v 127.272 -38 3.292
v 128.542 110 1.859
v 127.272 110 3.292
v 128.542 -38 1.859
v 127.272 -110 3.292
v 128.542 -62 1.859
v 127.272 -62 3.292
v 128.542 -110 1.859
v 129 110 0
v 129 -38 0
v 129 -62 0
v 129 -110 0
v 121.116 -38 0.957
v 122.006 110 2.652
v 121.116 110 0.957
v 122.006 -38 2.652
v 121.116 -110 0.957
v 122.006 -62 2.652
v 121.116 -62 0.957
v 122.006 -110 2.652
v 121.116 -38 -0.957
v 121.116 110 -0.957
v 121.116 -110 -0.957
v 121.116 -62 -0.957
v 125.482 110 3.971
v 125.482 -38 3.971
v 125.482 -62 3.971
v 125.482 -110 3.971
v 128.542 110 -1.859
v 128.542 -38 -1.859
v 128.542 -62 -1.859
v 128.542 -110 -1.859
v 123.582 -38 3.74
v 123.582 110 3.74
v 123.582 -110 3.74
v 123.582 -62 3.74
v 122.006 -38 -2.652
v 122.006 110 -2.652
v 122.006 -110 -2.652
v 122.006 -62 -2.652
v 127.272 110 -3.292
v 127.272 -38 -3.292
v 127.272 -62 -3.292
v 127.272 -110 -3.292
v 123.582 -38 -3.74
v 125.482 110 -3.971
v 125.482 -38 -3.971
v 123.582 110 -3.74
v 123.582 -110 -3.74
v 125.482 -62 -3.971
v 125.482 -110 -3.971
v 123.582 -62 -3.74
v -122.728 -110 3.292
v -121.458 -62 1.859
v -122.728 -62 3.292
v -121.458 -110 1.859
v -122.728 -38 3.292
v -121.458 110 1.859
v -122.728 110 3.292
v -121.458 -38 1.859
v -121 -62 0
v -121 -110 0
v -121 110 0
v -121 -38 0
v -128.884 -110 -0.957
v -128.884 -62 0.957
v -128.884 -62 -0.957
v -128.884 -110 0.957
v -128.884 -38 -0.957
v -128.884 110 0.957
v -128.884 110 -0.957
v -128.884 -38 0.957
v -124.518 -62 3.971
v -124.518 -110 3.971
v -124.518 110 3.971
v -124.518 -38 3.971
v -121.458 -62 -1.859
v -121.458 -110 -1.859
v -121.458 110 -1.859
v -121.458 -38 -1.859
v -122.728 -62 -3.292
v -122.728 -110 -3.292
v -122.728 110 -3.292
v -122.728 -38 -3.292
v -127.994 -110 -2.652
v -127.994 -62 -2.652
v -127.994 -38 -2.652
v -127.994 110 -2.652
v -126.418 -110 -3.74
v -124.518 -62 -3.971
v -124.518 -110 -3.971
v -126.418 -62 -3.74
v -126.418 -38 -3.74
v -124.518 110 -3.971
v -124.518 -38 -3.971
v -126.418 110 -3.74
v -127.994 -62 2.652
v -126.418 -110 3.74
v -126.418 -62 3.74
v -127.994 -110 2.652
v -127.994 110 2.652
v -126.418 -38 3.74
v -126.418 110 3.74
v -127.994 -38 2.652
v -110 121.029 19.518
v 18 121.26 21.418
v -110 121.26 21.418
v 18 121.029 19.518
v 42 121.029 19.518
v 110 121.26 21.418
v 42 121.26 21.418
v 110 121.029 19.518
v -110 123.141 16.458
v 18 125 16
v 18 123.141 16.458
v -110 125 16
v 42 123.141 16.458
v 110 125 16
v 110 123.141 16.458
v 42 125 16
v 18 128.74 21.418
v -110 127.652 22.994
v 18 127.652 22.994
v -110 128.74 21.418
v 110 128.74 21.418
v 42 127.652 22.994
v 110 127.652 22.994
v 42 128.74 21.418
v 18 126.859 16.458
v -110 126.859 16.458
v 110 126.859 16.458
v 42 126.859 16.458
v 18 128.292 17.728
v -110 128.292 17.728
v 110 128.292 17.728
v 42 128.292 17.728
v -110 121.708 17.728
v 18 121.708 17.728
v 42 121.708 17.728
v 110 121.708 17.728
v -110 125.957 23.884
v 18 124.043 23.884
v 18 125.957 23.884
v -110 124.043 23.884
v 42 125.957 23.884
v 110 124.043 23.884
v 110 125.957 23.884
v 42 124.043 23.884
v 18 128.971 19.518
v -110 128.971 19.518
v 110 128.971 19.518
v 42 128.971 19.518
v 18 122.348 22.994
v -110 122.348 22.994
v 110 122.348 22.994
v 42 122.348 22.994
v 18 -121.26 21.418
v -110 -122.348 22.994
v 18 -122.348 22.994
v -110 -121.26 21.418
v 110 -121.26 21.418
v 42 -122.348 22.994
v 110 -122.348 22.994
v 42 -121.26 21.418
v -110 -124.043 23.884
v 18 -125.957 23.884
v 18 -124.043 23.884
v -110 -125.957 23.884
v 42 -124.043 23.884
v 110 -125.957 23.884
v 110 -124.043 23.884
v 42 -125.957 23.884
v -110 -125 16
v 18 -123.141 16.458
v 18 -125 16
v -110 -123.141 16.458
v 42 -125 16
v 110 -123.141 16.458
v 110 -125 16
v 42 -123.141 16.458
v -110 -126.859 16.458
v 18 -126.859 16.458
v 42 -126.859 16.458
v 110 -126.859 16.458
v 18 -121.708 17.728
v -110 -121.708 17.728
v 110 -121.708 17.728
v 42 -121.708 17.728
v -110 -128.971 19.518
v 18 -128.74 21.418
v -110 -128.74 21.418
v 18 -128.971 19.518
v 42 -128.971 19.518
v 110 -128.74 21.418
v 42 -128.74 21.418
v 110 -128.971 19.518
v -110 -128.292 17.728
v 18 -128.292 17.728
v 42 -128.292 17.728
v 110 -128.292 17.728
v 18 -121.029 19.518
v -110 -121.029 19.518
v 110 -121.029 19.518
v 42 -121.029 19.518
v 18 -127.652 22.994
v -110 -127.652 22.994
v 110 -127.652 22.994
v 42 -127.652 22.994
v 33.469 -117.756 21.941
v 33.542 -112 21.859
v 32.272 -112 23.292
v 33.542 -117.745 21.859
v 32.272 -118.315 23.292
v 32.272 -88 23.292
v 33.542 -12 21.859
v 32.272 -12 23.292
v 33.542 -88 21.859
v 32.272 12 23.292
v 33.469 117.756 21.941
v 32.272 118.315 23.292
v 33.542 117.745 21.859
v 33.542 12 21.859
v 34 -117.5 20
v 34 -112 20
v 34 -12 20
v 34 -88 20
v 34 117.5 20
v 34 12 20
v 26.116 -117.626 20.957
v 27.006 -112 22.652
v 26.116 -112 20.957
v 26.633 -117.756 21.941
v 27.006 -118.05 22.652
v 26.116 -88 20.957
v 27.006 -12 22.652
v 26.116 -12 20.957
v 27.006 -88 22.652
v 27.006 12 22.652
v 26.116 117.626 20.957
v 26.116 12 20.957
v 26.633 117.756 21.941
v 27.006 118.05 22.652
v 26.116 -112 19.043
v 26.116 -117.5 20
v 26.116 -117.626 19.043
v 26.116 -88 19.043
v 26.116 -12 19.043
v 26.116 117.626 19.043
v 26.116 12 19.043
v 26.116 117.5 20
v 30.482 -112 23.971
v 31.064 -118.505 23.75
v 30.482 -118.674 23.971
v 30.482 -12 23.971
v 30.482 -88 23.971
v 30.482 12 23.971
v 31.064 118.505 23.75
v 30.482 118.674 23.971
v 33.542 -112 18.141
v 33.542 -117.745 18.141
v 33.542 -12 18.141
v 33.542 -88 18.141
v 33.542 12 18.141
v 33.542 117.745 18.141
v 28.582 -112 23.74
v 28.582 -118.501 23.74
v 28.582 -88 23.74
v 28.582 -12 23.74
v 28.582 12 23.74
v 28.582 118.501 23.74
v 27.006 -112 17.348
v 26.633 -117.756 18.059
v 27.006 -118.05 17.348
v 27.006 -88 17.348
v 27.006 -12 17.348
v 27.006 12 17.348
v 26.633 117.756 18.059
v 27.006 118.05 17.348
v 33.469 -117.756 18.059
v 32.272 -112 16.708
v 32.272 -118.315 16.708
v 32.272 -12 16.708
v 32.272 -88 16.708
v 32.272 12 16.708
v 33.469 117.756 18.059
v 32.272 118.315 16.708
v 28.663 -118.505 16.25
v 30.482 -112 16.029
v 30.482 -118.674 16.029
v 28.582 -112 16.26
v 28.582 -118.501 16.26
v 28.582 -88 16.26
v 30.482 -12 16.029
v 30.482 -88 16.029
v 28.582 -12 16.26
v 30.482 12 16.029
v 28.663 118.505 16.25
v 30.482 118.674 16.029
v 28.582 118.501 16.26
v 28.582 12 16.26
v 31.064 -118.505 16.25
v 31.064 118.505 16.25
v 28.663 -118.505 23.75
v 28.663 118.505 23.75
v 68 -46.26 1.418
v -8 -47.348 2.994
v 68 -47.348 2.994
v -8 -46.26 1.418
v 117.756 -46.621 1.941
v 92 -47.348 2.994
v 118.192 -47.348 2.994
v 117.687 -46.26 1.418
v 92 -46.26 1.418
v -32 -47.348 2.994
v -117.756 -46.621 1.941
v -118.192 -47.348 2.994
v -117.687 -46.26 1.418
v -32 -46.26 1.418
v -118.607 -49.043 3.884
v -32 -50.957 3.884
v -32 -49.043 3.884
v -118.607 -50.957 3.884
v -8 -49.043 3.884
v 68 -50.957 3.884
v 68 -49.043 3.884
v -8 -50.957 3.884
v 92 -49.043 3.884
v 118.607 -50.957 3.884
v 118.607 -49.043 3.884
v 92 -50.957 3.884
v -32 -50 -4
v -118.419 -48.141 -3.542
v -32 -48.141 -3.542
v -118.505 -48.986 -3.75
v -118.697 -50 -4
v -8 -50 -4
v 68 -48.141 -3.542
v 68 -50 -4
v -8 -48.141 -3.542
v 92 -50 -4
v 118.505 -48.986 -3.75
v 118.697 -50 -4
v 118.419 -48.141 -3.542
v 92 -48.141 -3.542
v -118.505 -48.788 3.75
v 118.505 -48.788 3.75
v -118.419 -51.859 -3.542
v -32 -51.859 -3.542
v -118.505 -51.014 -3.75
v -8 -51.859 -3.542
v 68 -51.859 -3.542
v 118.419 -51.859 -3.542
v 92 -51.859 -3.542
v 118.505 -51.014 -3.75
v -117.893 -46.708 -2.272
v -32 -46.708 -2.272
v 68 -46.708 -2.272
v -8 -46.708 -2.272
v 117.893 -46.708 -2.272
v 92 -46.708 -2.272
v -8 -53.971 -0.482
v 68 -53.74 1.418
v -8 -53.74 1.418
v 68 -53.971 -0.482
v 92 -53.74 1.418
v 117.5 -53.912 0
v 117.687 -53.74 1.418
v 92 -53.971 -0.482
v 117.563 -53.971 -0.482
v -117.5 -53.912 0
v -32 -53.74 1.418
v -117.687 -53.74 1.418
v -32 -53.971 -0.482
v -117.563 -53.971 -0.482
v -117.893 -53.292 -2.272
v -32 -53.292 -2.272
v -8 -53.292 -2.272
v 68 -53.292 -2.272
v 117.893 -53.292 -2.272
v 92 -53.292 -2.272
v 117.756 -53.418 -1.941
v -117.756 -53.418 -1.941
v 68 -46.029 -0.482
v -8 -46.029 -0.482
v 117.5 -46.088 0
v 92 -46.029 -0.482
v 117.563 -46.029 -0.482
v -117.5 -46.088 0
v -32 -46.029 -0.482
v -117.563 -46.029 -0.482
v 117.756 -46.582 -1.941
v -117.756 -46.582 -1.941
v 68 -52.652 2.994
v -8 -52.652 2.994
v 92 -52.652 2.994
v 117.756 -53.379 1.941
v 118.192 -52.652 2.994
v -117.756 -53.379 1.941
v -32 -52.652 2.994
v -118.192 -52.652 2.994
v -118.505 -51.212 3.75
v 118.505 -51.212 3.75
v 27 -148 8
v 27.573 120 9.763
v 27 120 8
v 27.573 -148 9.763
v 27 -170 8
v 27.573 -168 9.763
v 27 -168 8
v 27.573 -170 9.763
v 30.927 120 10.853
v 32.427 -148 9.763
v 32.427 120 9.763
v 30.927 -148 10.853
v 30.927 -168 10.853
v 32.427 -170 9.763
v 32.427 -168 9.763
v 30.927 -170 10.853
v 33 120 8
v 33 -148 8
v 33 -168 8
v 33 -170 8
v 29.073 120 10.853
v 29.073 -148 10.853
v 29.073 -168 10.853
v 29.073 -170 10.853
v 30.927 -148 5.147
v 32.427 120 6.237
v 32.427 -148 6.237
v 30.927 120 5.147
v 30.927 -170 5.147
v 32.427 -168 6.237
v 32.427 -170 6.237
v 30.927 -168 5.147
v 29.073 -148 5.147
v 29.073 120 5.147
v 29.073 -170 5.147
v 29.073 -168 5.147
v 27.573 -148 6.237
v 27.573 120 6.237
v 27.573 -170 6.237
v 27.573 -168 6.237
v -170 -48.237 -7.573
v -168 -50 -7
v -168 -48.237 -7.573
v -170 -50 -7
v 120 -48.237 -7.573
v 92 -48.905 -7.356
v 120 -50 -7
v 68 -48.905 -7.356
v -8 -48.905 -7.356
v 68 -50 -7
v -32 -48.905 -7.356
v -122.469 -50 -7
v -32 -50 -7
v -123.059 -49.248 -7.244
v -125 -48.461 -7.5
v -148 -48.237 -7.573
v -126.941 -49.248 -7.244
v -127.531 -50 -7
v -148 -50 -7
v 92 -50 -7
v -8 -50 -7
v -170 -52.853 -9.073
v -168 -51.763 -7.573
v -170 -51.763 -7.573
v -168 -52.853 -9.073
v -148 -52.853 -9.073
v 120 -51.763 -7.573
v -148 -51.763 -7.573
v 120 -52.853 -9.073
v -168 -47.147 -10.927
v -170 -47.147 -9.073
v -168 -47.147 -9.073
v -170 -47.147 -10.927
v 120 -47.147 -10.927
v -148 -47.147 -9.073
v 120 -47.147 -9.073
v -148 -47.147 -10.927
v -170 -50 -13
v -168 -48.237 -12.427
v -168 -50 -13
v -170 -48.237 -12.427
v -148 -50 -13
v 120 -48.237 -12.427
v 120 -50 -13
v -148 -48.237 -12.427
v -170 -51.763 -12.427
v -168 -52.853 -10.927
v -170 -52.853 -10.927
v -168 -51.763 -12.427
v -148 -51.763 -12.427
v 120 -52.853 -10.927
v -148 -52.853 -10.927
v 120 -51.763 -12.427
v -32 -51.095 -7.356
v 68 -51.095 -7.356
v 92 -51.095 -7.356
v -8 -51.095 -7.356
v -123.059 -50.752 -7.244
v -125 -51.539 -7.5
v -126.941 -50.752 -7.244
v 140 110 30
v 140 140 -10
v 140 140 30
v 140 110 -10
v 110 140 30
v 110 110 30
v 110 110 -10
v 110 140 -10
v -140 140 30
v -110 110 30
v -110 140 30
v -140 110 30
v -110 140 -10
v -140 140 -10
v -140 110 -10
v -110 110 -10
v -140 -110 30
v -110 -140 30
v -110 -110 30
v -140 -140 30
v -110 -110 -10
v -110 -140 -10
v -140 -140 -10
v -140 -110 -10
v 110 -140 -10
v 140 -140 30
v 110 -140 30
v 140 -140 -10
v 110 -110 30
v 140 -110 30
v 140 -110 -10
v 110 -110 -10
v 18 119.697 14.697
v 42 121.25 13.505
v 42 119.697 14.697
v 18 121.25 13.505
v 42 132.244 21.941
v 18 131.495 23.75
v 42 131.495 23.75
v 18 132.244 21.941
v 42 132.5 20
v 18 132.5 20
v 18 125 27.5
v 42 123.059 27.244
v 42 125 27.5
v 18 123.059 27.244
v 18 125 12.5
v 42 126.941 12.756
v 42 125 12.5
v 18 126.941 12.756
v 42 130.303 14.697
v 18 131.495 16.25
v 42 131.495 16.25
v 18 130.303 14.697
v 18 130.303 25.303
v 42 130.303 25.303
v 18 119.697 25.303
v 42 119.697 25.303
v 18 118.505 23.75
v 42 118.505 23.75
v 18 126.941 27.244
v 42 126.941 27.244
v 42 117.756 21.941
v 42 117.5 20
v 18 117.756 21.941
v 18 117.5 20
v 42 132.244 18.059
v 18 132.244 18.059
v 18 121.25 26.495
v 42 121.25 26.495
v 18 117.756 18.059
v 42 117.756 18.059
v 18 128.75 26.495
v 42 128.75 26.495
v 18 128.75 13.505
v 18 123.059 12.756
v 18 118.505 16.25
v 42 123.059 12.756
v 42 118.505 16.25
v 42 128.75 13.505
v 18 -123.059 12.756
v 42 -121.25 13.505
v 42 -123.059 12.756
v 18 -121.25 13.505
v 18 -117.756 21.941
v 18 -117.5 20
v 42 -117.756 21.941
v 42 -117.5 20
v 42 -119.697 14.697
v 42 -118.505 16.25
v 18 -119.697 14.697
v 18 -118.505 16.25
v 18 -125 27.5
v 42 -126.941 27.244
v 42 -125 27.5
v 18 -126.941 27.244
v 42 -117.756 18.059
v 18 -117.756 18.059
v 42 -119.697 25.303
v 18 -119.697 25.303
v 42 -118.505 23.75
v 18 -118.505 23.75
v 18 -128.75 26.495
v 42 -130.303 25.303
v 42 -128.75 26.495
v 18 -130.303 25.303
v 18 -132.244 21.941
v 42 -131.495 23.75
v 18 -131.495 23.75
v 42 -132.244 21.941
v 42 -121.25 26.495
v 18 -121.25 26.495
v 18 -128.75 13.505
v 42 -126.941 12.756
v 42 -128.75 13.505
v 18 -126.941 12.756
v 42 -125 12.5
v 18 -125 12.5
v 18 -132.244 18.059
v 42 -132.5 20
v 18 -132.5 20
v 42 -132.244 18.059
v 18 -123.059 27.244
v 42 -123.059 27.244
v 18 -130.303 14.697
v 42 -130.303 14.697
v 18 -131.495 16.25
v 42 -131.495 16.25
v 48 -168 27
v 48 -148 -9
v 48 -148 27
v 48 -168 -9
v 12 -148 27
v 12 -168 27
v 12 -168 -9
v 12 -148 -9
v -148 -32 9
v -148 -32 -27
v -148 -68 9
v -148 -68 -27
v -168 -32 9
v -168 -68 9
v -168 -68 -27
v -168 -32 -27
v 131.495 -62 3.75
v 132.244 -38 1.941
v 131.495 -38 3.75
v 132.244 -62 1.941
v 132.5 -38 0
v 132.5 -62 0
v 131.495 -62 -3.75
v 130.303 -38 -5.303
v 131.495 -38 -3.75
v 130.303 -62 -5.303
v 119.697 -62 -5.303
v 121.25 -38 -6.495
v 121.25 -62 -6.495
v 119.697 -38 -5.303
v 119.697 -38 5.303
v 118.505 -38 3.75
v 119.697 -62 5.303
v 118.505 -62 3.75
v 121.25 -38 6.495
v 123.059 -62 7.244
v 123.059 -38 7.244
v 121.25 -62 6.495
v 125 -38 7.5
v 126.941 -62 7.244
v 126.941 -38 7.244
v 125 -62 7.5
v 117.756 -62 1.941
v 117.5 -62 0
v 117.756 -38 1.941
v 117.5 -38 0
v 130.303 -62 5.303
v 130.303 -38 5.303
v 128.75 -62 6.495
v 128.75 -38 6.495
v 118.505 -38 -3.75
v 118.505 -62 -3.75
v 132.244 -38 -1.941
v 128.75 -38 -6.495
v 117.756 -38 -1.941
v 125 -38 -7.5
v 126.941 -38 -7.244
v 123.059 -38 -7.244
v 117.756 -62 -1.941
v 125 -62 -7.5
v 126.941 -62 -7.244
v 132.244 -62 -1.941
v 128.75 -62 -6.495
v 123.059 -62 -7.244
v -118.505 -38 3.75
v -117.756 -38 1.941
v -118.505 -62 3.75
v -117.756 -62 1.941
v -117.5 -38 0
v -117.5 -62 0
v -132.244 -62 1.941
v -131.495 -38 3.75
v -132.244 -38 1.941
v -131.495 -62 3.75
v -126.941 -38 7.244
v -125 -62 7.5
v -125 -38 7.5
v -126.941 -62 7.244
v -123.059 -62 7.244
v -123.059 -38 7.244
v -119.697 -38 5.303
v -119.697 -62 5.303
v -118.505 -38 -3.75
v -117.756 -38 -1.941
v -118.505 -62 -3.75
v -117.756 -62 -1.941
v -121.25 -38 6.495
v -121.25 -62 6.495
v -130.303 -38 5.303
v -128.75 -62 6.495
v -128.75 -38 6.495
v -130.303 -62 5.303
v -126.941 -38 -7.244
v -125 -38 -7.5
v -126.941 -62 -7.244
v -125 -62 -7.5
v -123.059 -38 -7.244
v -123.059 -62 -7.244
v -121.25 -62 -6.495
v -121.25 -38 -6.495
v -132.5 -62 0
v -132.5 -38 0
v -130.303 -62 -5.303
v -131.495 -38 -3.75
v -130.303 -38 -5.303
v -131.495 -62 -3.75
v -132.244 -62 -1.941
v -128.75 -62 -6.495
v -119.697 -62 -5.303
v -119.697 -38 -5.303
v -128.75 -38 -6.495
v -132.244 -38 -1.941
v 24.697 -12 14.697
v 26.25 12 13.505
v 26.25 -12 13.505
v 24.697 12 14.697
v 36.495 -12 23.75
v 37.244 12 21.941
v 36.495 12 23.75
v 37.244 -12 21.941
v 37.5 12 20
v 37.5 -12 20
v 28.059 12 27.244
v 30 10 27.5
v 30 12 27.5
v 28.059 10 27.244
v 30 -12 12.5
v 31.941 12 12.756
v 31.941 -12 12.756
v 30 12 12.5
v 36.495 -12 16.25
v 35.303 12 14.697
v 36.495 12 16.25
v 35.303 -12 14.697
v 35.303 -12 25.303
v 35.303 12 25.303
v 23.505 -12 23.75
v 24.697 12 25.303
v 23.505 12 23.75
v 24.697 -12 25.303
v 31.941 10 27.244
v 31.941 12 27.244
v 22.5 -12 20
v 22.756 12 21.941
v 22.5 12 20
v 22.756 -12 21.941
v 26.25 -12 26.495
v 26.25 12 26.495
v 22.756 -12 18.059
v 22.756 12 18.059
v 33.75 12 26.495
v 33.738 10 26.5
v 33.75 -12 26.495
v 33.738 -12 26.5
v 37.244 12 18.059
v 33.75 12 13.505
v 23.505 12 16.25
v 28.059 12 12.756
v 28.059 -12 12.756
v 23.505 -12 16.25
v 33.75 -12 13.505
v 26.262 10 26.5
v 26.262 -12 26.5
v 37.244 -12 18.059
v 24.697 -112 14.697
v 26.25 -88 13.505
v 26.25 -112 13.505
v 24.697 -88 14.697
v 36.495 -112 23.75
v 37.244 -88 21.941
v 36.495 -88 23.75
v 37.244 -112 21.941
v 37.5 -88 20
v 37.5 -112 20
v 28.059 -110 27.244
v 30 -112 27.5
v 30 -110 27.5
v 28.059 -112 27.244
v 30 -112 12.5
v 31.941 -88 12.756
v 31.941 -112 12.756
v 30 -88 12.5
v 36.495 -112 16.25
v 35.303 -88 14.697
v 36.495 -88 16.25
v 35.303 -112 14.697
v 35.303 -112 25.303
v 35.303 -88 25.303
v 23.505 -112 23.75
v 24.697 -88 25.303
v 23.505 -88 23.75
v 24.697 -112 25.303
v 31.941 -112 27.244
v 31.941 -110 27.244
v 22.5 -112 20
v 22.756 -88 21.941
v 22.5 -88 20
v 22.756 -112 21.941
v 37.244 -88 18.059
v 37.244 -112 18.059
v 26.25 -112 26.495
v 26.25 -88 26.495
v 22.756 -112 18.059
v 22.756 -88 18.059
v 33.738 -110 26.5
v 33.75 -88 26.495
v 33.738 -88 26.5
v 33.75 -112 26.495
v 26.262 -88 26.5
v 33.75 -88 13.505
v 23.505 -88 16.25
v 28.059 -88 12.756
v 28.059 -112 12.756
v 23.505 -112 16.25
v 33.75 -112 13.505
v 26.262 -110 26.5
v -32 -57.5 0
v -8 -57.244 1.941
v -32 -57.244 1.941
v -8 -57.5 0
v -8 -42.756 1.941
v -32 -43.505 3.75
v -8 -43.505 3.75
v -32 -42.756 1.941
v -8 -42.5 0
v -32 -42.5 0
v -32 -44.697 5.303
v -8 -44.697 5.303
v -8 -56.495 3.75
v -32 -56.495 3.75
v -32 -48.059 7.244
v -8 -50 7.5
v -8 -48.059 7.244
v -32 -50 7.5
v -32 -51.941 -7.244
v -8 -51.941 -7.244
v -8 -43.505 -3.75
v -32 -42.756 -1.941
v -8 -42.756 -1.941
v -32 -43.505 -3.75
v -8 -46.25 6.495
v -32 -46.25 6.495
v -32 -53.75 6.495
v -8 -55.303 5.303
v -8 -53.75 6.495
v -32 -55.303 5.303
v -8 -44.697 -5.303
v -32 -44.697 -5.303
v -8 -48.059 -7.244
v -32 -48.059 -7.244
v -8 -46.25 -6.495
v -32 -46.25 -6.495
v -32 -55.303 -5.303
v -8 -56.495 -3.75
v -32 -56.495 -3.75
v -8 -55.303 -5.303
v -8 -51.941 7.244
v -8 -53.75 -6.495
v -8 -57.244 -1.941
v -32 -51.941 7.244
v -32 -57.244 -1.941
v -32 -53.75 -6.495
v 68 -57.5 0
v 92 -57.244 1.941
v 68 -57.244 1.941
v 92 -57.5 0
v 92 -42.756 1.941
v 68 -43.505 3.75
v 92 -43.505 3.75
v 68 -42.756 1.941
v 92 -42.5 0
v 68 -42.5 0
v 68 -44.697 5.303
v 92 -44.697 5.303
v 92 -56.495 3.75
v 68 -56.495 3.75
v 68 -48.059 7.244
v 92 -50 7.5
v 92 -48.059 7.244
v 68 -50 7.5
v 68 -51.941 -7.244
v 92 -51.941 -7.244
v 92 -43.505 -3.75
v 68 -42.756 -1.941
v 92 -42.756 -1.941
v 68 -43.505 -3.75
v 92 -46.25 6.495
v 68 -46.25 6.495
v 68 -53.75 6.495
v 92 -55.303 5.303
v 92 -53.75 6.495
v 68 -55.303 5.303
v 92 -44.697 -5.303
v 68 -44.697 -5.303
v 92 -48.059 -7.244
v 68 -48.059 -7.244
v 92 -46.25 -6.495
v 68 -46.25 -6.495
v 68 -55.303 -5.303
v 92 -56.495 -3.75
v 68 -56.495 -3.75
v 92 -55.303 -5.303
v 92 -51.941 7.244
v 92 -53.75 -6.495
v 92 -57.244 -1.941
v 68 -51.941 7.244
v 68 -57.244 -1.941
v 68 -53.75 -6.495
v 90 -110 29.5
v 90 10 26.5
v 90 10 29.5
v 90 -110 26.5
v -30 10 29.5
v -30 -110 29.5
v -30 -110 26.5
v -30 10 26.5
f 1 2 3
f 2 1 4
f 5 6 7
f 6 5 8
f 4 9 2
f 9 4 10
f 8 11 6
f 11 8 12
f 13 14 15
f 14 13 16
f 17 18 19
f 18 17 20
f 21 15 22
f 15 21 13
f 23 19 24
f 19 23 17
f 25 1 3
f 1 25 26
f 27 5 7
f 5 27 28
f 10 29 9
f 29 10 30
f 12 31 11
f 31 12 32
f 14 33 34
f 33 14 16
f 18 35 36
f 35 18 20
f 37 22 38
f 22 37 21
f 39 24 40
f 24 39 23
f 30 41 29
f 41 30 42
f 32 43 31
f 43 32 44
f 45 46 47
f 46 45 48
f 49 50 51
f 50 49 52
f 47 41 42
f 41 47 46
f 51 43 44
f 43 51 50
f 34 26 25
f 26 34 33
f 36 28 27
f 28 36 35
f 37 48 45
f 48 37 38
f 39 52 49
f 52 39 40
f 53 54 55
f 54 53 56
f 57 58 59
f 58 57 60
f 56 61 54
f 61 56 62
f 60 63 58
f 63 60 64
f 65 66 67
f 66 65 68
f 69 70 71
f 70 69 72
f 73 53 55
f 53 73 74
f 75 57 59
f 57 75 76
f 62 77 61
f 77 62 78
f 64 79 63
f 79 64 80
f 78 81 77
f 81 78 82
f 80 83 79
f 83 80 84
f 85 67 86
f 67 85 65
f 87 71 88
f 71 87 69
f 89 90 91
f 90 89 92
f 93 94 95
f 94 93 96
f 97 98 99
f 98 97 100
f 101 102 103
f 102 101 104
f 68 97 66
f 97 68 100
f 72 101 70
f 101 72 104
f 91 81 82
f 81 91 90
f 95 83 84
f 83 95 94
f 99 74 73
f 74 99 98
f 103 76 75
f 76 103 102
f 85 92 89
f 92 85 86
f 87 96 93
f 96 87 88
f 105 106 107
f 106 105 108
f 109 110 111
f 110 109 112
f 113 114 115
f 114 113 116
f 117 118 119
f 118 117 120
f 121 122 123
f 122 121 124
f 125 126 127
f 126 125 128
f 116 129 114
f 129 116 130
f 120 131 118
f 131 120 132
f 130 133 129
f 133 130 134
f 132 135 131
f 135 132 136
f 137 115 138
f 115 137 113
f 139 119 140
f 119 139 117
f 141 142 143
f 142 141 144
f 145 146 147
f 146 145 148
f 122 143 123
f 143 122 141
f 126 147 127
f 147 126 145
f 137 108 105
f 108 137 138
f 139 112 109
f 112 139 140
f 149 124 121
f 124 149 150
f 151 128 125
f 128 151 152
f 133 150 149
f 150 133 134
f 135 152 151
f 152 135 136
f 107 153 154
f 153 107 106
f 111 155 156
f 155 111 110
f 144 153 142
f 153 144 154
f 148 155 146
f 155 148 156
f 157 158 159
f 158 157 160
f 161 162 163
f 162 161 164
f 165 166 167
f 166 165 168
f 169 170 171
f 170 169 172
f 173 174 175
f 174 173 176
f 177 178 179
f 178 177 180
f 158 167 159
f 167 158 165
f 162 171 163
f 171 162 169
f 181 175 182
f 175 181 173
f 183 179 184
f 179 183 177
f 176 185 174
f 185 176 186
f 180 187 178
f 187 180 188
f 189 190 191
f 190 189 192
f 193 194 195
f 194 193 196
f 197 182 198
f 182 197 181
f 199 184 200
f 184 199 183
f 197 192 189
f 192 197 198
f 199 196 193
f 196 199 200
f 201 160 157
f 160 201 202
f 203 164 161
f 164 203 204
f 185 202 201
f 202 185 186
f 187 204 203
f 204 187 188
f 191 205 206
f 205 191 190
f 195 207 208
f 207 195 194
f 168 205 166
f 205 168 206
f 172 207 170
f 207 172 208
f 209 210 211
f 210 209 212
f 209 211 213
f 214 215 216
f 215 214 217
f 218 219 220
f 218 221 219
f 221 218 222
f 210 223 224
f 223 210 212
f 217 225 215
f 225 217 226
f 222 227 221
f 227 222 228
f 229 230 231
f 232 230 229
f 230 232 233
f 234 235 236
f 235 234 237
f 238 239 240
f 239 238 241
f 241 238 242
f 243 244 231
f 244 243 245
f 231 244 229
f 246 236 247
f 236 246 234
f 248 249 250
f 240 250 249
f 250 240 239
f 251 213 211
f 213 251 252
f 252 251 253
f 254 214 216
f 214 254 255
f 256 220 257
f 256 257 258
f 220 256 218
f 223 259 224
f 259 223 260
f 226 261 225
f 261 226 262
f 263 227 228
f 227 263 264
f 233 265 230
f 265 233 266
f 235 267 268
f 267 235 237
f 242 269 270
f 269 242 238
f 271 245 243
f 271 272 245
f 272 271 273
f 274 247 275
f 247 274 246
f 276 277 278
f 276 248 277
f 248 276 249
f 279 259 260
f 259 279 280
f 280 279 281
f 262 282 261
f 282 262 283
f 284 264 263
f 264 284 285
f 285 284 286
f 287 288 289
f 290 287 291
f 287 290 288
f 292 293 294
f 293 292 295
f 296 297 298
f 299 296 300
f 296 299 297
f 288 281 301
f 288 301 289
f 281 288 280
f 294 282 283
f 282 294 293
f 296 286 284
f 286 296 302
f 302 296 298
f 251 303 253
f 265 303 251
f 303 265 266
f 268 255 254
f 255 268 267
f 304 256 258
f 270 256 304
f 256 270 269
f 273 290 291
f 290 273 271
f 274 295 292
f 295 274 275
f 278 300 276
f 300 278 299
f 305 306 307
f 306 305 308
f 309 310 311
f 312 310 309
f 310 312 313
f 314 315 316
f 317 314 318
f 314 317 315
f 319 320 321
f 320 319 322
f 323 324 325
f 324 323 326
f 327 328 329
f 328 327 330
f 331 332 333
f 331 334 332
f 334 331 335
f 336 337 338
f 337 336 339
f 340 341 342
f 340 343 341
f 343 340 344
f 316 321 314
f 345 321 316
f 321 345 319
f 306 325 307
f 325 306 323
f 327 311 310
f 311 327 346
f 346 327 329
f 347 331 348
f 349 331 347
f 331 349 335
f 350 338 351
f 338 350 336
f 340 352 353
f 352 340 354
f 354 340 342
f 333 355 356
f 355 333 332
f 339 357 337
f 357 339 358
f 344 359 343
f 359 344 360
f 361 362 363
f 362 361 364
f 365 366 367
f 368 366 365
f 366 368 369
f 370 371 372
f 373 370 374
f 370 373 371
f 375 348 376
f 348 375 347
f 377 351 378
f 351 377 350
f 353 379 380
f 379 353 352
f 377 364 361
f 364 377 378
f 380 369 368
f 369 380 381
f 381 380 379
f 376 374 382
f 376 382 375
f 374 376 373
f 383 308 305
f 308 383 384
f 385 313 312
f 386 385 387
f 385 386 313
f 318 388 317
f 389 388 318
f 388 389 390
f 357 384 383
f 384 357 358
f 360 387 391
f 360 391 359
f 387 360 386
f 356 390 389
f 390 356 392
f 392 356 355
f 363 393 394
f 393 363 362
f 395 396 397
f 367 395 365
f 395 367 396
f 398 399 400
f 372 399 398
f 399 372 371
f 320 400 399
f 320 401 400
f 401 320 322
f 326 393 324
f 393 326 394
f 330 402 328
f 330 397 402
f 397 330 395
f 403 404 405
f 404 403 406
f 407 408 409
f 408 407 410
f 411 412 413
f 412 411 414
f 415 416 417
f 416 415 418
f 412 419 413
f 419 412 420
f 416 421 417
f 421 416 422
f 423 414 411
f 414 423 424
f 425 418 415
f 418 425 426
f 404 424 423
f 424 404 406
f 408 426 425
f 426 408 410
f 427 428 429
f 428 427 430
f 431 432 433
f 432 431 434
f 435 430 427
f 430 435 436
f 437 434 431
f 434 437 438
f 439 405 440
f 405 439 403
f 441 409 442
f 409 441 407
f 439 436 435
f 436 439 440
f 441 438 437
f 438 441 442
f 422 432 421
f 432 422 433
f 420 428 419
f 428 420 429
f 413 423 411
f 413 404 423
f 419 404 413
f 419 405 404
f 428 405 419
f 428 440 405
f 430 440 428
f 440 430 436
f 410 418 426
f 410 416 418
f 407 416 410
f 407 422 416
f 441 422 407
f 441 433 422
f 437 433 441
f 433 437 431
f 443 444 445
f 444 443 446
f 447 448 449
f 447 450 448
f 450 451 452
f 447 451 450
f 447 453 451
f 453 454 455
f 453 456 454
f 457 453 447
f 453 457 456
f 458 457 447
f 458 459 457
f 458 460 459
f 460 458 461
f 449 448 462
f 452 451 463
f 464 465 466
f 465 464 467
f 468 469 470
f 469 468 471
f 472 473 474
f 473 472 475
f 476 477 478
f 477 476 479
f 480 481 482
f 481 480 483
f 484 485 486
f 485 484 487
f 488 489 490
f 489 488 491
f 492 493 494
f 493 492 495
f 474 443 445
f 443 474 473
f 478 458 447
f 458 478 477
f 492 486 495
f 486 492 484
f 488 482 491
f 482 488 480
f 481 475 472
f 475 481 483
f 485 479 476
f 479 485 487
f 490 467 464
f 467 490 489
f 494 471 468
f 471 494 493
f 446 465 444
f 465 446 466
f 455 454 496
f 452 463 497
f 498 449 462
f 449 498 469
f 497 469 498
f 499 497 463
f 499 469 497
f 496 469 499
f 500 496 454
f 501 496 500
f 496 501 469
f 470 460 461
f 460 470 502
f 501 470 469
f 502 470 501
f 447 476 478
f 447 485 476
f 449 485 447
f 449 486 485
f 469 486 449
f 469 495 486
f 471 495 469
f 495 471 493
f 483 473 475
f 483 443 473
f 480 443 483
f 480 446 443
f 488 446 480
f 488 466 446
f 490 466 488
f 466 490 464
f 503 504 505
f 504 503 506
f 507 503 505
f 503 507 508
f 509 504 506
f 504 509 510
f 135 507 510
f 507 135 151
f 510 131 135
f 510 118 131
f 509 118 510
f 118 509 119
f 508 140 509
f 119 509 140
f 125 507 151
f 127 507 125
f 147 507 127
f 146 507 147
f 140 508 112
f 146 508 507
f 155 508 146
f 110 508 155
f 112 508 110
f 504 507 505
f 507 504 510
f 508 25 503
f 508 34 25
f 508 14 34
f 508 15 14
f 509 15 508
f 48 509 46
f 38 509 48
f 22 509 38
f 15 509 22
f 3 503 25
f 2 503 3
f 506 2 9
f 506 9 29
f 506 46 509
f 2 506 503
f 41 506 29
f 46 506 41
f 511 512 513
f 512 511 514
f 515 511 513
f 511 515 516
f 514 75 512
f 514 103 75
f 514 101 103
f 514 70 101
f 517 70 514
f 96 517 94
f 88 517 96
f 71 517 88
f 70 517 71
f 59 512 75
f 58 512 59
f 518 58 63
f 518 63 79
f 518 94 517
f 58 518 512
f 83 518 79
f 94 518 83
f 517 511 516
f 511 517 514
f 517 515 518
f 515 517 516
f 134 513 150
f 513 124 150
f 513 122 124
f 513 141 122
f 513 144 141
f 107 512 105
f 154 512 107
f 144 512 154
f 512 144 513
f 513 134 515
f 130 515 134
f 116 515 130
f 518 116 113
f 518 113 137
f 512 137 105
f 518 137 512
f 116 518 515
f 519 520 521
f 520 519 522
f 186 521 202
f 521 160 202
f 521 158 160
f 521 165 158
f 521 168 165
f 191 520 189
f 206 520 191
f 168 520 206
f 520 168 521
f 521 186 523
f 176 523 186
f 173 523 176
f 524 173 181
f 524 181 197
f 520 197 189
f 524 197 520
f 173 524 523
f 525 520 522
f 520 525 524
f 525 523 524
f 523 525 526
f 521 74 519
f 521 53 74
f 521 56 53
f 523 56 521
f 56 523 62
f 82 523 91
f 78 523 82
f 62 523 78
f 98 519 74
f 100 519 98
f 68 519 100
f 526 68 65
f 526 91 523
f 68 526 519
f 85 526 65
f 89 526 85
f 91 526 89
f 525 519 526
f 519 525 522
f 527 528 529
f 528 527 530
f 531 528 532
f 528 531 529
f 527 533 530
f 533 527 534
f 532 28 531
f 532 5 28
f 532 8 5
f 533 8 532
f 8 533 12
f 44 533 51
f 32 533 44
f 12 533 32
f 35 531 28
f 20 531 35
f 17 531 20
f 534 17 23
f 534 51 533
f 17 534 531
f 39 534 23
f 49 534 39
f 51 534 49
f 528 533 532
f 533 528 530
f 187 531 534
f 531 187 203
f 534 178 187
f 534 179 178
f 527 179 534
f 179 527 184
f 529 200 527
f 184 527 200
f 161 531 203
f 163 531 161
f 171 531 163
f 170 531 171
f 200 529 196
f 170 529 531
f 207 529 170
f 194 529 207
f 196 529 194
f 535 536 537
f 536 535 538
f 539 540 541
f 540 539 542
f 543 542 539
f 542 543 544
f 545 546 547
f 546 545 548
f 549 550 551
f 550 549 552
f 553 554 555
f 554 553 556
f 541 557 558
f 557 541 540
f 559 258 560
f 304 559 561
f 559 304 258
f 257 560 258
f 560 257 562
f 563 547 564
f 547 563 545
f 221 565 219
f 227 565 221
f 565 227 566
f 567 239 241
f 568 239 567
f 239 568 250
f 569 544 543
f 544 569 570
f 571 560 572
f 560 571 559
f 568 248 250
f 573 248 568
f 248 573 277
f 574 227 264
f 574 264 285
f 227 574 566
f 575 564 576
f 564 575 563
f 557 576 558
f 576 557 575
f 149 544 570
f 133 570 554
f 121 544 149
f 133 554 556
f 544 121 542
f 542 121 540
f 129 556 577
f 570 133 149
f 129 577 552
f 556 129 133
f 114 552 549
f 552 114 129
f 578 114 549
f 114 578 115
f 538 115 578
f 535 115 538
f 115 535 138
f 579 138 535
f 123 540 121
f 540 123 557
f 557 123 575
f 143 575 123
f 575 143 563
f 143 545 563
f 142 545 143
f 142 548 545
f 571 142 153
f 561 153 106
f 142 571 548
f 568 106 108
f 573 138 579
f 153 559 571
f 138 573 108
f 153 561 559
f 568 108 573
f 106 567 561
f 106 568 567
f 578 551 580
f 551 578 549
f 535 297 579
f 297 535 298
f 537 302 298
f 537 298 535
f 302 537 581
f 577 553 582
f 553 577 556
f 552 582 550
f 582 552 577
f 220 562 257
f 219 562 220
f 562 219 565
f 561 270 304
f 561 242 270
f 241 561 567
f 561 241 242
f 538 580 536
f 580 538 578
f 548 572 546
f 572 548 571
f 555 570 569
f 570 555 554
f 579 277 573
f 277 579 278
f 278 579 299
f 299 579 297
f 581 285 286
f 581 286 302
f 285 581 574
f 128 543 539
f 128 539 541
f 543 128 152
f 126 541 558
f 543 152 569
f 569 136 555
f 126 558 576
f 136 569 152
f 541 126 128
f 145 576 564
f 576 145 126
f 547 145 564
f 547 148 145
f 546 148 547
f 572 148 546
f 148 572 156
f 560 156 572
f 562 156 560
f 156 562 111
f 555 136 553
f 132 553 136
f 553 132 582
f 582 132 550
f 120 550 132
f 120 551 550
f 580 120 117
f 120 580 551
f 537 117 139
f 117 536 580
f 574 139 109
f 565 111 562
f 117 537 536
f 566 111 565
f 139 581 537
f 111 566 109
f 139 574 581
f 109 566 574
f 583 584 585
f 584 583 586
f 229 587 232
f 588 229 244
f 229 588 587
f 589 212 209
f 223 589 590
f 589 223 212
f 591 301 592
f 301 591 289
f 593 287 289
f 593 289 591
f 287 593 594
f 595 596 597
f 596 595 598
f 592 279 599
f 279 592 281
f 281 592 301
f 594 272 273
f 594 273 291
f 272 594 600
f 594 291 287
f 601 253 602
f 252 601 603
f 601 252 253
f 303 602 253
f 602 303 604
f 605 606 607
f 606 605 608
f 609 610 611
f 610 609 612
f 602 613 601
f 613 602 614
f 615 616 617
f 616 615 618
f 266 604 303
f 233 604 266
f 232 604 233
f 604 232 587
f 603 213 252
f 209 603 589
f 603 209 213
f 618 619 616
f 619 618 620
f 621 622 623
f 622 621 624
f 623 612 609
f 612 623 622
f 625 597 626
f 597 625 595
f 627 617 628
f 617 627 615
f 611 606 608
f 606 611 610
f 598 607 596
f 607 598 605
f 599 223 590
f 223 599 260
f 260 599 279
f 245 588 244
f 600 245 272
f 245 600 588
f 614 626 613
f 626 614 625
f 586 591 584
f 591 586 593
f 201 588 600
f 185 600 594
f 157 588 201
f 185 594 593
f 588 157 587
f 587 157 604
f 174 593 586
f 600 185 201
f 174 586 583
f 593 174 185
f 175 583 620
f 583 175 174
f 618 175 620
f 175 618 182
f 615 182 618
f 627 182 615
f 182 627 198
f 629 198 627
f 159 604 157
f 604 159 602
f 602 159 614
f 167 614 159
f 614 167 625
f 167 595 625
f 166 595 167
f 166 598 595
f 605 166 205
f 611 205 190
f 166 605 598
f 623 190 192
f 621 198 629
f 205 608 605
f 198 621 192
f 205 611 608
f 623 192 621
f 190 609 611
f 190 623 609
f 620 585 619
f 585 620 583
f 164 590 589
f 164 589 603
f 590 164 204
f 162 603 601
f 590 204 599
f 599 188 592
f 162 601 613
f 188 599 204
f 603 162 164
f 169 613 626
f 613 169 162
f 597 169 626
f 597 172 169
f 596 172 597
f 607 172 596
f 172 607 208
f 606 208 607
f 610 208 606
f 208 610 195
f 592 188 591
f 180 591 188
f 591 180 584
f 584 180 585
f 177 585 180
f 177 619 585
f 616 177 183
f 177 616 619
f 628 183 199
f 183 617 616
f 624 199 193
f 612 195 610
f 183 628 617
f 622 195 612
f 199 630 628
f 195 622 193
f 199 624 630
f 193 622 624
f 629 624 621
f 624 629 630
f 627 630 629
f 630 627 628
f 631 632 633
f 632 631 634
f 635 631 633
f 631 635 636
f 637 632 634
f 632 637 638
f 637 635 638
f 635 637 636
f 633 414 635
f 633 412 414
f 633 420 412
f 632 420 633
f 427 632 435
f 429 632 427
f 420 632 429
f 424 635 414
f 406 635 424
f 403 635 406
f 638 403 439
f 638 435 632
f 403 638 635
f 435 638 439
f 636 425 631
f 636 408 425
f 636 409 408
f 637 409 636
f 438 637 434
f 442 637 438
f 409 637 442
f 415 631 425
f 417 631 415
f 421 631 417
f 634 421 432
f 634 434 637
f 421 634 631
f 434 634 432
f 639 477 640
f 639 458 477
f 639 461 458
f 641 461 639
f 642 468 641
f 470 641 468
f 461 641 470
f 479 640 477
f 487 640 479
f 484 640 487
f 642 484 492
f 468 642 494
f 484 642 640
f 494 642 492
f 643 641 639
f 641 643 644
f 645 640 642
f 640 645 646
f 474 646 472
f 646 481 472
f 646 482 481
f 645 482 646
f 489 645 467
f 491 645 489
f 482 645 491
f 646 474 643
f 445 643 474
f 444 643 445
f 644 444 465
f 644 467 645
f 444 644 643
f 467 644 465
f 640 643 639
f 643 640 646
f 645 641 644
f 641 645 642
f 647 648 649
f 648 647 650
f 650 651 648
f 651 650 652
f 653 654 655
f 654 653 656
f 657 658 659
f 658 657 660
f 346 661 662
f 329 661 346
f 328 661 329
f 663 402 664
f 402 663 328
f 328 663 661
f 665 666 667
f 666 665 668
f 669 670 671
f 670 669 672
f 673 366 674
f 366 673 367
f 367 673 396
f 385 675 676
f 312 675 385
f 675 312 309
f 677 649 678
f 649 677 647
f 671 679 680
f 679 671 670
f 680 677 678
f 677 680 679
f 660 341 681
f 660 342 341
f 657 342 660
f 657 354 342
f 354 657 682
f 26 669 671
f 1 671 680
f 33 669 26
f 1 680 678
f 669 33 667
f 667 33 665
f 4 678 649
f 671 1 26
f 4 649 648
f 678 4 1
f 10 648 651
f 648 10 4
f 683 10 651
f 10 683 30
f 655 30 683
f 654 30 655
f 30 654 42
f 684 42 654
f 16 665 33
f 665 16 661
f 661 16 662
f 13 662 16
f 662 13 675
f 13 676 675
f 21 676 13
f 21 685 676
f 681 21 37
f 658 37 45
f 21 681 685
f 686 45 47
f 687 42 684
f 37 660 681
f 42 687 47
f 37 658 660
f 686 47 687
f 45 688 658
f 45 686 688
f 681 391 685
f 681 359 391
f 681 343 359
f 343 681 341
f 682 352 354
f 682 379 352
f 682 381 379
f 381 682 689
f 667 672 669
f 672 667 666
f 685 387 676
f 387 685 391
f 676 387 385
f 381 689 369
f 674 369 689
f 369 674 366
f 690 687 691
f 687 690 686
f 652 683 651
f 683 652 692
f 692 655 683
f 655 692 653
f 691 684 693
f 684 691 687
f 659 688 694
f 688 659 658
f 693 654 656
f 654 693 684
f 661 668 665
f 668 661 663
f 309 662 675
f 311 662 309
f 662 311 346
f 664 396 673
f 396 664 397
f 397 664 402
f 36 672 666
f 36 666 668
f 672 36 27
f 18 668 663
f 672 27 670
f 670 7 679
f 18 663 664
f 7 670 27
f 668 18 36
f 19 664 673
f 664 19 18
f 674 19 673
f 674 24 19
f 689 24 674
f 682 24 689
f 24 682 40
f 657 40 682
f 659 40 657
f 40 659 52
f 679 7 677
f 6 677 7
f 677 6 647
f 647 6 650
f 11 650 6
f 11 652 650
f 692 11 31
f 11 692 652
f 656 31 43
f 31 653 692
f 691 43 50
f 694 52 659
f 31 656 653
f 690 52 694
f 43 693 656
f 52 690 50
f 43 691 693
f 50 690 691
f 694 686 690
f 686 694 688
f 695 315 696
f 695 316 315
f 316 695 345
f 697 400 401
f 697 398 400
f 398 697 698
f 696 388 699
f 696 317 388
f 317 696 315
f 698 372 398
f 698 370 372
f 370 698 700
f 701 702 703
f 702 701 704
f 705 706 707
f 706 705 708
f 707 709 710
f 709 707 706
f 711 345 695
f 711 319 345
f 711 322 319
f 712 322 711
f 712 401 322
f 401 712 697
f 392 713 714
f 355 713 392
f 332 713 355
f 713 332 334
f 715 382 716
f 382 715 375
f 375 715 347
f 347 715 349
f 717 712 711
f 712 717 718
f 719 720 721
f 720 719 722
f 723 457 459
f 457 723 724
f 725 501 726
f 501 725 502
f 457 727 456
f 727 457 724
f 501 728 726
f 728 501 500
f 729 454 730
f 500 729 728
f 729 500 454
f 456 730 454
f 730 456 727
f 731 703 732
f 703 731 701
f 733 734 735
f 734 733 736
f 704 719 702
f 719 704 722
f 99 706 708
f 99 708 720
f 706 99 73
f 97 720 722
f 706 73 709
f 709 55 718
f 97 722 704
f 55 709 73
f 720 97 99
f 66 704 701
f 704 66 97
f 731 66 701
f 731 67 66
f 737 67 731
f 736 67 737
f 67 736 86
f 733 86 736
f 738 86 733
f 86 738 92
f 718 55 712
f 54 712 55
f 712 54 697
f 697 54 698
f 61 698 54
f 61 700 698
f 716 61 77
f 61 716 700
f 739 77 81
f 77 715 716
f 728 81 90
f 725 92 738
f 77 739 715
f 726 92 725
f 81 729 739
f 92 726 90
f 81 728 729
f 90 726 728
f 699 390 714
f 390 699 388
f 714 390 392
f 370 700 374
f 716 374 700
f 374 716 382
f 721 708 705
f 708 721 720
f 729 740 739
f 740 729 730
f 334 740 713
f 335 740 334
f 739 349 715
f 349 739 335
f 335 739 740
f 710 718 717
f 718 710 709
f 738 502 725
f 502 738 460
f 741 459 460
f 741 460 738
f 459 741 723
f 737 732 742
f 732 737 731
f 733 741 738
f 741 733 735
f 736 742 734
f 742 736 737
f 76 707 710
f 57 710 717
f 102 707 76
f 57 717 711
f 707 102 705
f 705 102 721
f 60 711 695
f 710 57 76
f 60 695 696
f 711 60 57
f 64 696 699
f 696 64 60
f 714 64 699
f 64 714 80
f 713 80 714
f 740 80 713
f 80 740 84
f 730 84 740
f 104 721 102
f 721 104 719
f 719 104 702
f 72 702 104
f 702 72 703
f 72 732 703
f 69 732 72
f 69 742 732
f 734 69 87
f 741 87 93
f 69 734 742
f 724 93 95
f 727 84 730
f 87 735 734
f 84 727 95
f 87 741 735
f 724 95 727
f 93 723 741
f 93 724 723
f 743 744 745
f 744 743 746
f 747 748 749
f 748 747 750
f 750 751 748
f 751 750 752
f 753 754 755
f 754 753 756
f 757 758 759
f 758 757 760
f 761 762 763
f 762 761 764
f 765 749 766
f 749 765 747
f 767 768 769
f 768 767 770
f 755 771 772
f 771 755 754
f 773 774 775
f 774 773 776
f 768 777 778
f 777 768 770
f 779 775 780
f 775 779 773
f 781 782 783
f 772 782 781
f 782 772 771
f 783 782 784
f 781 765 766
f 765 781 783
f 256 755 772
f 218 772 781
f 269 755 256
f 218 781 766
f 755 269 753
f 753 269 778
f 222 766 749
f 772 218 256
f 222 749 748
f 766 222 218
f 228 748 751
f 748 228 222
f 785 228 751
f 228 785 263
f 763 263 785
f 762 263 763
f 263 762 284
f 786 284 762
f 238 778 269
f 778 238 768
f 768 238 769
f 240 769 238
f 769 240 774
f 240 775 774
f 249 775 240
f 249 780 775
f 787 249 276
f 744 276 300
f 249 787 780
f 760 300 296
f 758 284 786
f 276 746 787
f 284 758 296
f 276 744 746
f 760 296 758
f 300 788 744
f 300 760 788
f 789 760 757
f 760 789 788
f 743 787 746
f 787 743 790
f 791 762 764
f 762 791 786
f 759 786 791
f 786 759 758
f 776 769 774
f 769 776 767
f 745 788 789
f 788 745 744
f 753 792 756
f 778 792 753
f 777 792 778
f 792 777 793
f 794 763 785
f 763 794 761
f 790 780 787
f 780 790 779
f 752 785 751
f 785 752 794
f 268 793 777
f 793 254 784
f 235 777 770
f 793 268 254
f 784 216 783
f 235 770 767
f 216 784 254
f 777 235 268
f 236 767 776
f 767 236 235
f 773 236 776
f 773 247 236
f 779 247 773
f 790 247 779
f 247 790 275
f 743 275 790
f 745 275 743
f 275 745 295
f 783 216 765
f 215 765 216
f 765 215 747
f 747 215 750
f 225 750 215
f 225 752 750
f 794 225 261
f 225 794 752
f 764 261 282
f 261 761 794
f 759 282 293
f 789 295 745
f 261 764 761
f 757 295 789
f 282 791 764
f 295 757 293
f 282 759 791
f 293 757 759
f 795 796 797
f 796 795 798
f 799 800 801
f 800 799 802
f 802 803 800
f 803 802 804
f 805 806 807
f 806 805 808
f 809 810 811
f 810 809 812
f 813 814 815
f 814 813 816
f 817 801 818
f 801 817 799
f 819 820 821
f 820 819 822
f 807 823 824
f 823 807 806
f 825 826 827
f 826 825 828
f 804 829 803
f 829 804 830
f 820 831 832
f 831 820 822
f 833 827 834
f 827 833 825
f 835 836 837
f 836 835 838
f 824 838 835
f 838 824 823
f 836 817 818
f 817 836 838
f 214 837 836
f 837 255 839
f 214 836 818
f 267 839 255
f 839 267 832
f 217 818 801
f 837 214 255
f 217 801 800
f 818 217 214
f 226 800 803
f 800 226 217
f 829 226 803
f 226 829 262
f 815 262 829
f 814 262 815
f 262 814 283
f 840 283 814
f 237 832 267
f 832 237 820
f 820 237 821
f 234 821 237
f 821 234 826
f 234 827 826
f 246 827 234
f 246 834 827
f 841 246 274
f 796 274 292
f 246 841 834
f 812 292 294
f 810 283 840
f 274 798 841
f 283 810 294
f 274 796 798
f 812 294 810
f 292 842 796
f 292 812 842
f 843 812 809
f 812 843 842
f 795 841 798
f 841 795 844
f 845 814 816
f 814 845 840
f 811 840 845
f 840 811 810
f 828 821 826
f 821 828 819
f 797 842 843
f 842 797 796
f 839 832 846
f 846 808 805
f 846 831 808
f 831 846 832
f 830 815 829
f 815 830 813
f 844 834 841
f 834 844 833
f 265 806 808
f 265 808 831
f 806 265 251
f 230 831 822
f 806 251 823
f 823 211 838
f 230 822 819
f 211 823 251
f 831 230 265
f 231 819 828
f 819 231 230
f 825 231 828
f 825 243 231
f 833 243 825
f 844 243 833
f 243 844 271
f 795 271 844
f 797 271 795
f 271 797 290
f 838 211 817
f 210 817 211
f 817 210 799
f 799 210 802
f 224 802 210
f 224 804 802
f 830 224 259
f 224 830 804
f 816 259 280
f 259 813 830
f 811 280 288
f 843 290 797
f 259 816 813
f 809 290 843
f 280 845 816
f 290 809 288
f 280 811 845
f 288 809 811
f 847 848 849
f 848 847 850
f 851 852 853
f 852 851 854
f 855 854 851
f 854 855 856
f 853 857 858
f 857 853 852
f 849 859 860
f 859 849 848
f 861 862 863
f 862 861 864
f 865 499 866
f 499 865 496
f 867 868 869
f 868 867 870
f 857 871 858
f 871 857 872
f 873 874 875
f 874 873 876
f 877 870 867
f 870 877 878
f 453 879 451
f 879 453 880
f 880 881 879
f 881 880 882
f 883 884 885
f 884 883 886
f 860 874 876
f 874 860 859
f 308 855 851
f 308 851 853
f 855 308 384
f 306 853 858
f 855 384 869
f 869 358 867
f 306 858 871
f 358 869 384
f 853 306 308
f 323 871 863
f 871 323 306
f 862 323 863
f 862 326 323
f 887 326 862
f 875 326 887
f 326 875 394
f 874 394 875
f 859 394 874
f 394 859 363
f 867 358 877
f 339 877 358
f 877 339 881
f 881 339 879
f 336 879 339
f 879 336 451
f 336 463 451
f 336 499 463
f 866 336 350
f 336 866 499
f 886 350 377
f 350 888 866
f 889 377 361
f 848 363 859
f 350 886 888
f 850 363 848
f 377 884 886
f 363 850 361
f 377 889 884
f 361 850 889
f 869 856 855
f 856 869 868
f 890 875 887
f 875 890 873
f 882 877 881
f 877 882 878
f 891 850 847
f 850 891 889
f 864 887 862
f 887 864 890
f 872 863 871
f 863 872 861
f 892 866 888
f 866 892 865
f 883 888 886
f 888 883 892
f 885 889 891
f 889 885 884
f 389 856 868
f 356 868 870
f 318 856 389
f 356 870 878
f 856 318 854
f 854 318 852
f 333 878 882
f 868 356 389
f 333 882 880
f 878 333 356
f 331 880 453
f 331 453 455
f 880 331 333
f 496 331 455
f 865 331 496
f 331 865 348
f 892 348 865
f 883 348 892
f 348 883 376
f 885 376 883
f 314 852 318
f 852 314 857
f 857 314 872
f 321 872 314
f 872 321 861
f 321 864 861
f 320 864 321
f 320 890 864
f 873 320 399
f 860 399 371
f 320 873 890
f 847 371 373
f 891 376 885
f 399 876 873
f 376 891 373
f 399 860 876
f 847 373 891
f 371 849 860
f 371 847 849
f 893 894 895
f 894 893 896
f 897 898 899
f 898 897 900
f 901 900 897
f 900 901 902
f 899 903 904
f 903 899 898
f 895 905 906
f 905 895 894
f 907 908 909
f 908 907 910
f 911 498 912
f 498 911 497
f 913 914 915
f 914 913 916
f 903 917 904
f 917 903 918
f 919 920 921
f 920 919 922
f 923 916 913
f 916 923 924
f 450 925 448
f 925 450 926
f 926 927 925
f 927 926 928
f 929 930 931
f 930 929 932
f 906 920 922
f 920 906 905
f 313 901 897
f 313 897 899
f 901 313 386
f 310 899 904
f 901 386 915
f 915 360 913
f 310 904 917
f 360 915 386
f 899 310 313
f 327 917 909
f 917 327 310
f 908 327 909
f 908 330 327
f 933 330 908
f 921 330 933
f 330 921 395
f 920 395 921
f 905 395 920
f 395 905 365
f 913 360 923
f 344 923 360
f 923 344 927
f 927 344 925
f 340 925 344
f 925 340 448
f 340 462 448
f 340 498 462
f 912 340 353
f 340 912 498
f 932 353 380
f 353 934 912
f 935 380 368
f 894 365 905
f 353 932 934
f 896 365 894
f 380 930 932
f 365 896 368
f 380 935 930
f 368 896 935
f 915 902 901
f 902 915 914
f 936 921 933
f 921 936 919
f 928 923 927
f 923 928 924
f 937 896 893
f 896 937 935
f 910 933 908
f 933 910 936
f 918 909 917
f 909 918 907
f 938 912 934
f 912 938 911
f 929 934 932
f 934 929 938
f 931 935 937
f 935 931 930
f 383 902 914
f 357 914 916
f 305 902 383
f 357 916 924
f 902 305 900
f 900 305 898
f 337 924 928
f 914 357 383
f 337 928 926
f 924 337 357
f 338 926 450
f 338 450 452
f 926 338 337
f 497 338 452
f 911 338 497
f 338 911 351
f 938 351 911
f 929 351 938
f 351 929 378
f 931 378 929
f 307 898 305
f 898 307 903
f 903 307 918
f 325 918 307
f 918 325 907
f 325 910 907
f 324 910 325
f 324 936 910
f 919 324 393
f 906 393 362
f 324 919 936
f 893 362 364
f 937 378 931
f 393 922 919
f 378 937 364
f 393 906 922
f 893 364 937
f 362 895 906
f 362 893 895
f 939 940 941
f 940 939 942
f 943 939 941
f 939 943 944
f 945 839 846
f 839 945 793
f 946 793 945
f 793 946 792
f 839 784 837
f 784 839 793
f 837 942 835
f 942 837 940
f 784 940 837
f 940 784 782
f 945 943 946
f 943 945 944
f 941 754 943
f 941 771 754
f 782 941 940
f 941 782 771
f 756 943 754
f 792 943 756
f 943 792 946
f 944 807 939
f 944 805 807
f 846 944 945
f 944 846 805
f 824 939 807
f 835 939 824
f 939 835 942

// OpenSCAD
module bearing(){
color("Green"){
rotate([90,0,0])cylinder(r=15/2,h=24,center=true);
}}

color("Gray"){
translate([125,0,0])rotate([90,0,0])cylinder(r=4,h=250,center=true);
translate([-125,0,0])rotate([90,0,0])cylinder(r=4,h=250,center=true);
translate([0,125,20])rotate([0,90,0])cylinder(r=4,h=250,center=true);
translate([0,-125,20])rotate([0,90,0])cylinder(r=4,h=250,center=true);
}

color("LightGrey"){
translate([30,0,20])rotate([90,0,0])cylinder(r=4,h=240,center=true);
translate([0,-50,0])rotate([0,90,0])cylinder(r=4,h=240,center=true);
}

color("Crimson"){
translate([30,-50/2,8])rotate([90,0,0])cylinder(r=3,h=240+50,center=true);
translate([-50/2,-50,-10])rotate([0,90,0])cylinder(r=3,h=240+50,center=true);

}

color("Blue"){
for(i=[0:3])
rotate([0,0,90*i])translate([110,110,-10])cube([30,30,40]);
}



translate([125,-50,0])bearing();
translate([-125,-50,0])bearing();
rotate([0,0,90]){
translate([125,-30,20])bearing();
translate([-125,-30,20])bearing();
}

translate([30,-50+50,20])bearing();
translate([30,-50-50,20])bearing();
translate([30-50,-50,0])rotate([0,0,90])bearing();
translate([30+50,-50,0])rotate([0,0,90])bearing();

color("Fuchsia",0.5){
translate([30,-50,28])cube([120,120,3],center=true);}

color("Teal"){
translate([30,-158,9])cube([36,20,36],center=true);
translate([-158,-50,-9])cube([20,36,36],center=true);

}
